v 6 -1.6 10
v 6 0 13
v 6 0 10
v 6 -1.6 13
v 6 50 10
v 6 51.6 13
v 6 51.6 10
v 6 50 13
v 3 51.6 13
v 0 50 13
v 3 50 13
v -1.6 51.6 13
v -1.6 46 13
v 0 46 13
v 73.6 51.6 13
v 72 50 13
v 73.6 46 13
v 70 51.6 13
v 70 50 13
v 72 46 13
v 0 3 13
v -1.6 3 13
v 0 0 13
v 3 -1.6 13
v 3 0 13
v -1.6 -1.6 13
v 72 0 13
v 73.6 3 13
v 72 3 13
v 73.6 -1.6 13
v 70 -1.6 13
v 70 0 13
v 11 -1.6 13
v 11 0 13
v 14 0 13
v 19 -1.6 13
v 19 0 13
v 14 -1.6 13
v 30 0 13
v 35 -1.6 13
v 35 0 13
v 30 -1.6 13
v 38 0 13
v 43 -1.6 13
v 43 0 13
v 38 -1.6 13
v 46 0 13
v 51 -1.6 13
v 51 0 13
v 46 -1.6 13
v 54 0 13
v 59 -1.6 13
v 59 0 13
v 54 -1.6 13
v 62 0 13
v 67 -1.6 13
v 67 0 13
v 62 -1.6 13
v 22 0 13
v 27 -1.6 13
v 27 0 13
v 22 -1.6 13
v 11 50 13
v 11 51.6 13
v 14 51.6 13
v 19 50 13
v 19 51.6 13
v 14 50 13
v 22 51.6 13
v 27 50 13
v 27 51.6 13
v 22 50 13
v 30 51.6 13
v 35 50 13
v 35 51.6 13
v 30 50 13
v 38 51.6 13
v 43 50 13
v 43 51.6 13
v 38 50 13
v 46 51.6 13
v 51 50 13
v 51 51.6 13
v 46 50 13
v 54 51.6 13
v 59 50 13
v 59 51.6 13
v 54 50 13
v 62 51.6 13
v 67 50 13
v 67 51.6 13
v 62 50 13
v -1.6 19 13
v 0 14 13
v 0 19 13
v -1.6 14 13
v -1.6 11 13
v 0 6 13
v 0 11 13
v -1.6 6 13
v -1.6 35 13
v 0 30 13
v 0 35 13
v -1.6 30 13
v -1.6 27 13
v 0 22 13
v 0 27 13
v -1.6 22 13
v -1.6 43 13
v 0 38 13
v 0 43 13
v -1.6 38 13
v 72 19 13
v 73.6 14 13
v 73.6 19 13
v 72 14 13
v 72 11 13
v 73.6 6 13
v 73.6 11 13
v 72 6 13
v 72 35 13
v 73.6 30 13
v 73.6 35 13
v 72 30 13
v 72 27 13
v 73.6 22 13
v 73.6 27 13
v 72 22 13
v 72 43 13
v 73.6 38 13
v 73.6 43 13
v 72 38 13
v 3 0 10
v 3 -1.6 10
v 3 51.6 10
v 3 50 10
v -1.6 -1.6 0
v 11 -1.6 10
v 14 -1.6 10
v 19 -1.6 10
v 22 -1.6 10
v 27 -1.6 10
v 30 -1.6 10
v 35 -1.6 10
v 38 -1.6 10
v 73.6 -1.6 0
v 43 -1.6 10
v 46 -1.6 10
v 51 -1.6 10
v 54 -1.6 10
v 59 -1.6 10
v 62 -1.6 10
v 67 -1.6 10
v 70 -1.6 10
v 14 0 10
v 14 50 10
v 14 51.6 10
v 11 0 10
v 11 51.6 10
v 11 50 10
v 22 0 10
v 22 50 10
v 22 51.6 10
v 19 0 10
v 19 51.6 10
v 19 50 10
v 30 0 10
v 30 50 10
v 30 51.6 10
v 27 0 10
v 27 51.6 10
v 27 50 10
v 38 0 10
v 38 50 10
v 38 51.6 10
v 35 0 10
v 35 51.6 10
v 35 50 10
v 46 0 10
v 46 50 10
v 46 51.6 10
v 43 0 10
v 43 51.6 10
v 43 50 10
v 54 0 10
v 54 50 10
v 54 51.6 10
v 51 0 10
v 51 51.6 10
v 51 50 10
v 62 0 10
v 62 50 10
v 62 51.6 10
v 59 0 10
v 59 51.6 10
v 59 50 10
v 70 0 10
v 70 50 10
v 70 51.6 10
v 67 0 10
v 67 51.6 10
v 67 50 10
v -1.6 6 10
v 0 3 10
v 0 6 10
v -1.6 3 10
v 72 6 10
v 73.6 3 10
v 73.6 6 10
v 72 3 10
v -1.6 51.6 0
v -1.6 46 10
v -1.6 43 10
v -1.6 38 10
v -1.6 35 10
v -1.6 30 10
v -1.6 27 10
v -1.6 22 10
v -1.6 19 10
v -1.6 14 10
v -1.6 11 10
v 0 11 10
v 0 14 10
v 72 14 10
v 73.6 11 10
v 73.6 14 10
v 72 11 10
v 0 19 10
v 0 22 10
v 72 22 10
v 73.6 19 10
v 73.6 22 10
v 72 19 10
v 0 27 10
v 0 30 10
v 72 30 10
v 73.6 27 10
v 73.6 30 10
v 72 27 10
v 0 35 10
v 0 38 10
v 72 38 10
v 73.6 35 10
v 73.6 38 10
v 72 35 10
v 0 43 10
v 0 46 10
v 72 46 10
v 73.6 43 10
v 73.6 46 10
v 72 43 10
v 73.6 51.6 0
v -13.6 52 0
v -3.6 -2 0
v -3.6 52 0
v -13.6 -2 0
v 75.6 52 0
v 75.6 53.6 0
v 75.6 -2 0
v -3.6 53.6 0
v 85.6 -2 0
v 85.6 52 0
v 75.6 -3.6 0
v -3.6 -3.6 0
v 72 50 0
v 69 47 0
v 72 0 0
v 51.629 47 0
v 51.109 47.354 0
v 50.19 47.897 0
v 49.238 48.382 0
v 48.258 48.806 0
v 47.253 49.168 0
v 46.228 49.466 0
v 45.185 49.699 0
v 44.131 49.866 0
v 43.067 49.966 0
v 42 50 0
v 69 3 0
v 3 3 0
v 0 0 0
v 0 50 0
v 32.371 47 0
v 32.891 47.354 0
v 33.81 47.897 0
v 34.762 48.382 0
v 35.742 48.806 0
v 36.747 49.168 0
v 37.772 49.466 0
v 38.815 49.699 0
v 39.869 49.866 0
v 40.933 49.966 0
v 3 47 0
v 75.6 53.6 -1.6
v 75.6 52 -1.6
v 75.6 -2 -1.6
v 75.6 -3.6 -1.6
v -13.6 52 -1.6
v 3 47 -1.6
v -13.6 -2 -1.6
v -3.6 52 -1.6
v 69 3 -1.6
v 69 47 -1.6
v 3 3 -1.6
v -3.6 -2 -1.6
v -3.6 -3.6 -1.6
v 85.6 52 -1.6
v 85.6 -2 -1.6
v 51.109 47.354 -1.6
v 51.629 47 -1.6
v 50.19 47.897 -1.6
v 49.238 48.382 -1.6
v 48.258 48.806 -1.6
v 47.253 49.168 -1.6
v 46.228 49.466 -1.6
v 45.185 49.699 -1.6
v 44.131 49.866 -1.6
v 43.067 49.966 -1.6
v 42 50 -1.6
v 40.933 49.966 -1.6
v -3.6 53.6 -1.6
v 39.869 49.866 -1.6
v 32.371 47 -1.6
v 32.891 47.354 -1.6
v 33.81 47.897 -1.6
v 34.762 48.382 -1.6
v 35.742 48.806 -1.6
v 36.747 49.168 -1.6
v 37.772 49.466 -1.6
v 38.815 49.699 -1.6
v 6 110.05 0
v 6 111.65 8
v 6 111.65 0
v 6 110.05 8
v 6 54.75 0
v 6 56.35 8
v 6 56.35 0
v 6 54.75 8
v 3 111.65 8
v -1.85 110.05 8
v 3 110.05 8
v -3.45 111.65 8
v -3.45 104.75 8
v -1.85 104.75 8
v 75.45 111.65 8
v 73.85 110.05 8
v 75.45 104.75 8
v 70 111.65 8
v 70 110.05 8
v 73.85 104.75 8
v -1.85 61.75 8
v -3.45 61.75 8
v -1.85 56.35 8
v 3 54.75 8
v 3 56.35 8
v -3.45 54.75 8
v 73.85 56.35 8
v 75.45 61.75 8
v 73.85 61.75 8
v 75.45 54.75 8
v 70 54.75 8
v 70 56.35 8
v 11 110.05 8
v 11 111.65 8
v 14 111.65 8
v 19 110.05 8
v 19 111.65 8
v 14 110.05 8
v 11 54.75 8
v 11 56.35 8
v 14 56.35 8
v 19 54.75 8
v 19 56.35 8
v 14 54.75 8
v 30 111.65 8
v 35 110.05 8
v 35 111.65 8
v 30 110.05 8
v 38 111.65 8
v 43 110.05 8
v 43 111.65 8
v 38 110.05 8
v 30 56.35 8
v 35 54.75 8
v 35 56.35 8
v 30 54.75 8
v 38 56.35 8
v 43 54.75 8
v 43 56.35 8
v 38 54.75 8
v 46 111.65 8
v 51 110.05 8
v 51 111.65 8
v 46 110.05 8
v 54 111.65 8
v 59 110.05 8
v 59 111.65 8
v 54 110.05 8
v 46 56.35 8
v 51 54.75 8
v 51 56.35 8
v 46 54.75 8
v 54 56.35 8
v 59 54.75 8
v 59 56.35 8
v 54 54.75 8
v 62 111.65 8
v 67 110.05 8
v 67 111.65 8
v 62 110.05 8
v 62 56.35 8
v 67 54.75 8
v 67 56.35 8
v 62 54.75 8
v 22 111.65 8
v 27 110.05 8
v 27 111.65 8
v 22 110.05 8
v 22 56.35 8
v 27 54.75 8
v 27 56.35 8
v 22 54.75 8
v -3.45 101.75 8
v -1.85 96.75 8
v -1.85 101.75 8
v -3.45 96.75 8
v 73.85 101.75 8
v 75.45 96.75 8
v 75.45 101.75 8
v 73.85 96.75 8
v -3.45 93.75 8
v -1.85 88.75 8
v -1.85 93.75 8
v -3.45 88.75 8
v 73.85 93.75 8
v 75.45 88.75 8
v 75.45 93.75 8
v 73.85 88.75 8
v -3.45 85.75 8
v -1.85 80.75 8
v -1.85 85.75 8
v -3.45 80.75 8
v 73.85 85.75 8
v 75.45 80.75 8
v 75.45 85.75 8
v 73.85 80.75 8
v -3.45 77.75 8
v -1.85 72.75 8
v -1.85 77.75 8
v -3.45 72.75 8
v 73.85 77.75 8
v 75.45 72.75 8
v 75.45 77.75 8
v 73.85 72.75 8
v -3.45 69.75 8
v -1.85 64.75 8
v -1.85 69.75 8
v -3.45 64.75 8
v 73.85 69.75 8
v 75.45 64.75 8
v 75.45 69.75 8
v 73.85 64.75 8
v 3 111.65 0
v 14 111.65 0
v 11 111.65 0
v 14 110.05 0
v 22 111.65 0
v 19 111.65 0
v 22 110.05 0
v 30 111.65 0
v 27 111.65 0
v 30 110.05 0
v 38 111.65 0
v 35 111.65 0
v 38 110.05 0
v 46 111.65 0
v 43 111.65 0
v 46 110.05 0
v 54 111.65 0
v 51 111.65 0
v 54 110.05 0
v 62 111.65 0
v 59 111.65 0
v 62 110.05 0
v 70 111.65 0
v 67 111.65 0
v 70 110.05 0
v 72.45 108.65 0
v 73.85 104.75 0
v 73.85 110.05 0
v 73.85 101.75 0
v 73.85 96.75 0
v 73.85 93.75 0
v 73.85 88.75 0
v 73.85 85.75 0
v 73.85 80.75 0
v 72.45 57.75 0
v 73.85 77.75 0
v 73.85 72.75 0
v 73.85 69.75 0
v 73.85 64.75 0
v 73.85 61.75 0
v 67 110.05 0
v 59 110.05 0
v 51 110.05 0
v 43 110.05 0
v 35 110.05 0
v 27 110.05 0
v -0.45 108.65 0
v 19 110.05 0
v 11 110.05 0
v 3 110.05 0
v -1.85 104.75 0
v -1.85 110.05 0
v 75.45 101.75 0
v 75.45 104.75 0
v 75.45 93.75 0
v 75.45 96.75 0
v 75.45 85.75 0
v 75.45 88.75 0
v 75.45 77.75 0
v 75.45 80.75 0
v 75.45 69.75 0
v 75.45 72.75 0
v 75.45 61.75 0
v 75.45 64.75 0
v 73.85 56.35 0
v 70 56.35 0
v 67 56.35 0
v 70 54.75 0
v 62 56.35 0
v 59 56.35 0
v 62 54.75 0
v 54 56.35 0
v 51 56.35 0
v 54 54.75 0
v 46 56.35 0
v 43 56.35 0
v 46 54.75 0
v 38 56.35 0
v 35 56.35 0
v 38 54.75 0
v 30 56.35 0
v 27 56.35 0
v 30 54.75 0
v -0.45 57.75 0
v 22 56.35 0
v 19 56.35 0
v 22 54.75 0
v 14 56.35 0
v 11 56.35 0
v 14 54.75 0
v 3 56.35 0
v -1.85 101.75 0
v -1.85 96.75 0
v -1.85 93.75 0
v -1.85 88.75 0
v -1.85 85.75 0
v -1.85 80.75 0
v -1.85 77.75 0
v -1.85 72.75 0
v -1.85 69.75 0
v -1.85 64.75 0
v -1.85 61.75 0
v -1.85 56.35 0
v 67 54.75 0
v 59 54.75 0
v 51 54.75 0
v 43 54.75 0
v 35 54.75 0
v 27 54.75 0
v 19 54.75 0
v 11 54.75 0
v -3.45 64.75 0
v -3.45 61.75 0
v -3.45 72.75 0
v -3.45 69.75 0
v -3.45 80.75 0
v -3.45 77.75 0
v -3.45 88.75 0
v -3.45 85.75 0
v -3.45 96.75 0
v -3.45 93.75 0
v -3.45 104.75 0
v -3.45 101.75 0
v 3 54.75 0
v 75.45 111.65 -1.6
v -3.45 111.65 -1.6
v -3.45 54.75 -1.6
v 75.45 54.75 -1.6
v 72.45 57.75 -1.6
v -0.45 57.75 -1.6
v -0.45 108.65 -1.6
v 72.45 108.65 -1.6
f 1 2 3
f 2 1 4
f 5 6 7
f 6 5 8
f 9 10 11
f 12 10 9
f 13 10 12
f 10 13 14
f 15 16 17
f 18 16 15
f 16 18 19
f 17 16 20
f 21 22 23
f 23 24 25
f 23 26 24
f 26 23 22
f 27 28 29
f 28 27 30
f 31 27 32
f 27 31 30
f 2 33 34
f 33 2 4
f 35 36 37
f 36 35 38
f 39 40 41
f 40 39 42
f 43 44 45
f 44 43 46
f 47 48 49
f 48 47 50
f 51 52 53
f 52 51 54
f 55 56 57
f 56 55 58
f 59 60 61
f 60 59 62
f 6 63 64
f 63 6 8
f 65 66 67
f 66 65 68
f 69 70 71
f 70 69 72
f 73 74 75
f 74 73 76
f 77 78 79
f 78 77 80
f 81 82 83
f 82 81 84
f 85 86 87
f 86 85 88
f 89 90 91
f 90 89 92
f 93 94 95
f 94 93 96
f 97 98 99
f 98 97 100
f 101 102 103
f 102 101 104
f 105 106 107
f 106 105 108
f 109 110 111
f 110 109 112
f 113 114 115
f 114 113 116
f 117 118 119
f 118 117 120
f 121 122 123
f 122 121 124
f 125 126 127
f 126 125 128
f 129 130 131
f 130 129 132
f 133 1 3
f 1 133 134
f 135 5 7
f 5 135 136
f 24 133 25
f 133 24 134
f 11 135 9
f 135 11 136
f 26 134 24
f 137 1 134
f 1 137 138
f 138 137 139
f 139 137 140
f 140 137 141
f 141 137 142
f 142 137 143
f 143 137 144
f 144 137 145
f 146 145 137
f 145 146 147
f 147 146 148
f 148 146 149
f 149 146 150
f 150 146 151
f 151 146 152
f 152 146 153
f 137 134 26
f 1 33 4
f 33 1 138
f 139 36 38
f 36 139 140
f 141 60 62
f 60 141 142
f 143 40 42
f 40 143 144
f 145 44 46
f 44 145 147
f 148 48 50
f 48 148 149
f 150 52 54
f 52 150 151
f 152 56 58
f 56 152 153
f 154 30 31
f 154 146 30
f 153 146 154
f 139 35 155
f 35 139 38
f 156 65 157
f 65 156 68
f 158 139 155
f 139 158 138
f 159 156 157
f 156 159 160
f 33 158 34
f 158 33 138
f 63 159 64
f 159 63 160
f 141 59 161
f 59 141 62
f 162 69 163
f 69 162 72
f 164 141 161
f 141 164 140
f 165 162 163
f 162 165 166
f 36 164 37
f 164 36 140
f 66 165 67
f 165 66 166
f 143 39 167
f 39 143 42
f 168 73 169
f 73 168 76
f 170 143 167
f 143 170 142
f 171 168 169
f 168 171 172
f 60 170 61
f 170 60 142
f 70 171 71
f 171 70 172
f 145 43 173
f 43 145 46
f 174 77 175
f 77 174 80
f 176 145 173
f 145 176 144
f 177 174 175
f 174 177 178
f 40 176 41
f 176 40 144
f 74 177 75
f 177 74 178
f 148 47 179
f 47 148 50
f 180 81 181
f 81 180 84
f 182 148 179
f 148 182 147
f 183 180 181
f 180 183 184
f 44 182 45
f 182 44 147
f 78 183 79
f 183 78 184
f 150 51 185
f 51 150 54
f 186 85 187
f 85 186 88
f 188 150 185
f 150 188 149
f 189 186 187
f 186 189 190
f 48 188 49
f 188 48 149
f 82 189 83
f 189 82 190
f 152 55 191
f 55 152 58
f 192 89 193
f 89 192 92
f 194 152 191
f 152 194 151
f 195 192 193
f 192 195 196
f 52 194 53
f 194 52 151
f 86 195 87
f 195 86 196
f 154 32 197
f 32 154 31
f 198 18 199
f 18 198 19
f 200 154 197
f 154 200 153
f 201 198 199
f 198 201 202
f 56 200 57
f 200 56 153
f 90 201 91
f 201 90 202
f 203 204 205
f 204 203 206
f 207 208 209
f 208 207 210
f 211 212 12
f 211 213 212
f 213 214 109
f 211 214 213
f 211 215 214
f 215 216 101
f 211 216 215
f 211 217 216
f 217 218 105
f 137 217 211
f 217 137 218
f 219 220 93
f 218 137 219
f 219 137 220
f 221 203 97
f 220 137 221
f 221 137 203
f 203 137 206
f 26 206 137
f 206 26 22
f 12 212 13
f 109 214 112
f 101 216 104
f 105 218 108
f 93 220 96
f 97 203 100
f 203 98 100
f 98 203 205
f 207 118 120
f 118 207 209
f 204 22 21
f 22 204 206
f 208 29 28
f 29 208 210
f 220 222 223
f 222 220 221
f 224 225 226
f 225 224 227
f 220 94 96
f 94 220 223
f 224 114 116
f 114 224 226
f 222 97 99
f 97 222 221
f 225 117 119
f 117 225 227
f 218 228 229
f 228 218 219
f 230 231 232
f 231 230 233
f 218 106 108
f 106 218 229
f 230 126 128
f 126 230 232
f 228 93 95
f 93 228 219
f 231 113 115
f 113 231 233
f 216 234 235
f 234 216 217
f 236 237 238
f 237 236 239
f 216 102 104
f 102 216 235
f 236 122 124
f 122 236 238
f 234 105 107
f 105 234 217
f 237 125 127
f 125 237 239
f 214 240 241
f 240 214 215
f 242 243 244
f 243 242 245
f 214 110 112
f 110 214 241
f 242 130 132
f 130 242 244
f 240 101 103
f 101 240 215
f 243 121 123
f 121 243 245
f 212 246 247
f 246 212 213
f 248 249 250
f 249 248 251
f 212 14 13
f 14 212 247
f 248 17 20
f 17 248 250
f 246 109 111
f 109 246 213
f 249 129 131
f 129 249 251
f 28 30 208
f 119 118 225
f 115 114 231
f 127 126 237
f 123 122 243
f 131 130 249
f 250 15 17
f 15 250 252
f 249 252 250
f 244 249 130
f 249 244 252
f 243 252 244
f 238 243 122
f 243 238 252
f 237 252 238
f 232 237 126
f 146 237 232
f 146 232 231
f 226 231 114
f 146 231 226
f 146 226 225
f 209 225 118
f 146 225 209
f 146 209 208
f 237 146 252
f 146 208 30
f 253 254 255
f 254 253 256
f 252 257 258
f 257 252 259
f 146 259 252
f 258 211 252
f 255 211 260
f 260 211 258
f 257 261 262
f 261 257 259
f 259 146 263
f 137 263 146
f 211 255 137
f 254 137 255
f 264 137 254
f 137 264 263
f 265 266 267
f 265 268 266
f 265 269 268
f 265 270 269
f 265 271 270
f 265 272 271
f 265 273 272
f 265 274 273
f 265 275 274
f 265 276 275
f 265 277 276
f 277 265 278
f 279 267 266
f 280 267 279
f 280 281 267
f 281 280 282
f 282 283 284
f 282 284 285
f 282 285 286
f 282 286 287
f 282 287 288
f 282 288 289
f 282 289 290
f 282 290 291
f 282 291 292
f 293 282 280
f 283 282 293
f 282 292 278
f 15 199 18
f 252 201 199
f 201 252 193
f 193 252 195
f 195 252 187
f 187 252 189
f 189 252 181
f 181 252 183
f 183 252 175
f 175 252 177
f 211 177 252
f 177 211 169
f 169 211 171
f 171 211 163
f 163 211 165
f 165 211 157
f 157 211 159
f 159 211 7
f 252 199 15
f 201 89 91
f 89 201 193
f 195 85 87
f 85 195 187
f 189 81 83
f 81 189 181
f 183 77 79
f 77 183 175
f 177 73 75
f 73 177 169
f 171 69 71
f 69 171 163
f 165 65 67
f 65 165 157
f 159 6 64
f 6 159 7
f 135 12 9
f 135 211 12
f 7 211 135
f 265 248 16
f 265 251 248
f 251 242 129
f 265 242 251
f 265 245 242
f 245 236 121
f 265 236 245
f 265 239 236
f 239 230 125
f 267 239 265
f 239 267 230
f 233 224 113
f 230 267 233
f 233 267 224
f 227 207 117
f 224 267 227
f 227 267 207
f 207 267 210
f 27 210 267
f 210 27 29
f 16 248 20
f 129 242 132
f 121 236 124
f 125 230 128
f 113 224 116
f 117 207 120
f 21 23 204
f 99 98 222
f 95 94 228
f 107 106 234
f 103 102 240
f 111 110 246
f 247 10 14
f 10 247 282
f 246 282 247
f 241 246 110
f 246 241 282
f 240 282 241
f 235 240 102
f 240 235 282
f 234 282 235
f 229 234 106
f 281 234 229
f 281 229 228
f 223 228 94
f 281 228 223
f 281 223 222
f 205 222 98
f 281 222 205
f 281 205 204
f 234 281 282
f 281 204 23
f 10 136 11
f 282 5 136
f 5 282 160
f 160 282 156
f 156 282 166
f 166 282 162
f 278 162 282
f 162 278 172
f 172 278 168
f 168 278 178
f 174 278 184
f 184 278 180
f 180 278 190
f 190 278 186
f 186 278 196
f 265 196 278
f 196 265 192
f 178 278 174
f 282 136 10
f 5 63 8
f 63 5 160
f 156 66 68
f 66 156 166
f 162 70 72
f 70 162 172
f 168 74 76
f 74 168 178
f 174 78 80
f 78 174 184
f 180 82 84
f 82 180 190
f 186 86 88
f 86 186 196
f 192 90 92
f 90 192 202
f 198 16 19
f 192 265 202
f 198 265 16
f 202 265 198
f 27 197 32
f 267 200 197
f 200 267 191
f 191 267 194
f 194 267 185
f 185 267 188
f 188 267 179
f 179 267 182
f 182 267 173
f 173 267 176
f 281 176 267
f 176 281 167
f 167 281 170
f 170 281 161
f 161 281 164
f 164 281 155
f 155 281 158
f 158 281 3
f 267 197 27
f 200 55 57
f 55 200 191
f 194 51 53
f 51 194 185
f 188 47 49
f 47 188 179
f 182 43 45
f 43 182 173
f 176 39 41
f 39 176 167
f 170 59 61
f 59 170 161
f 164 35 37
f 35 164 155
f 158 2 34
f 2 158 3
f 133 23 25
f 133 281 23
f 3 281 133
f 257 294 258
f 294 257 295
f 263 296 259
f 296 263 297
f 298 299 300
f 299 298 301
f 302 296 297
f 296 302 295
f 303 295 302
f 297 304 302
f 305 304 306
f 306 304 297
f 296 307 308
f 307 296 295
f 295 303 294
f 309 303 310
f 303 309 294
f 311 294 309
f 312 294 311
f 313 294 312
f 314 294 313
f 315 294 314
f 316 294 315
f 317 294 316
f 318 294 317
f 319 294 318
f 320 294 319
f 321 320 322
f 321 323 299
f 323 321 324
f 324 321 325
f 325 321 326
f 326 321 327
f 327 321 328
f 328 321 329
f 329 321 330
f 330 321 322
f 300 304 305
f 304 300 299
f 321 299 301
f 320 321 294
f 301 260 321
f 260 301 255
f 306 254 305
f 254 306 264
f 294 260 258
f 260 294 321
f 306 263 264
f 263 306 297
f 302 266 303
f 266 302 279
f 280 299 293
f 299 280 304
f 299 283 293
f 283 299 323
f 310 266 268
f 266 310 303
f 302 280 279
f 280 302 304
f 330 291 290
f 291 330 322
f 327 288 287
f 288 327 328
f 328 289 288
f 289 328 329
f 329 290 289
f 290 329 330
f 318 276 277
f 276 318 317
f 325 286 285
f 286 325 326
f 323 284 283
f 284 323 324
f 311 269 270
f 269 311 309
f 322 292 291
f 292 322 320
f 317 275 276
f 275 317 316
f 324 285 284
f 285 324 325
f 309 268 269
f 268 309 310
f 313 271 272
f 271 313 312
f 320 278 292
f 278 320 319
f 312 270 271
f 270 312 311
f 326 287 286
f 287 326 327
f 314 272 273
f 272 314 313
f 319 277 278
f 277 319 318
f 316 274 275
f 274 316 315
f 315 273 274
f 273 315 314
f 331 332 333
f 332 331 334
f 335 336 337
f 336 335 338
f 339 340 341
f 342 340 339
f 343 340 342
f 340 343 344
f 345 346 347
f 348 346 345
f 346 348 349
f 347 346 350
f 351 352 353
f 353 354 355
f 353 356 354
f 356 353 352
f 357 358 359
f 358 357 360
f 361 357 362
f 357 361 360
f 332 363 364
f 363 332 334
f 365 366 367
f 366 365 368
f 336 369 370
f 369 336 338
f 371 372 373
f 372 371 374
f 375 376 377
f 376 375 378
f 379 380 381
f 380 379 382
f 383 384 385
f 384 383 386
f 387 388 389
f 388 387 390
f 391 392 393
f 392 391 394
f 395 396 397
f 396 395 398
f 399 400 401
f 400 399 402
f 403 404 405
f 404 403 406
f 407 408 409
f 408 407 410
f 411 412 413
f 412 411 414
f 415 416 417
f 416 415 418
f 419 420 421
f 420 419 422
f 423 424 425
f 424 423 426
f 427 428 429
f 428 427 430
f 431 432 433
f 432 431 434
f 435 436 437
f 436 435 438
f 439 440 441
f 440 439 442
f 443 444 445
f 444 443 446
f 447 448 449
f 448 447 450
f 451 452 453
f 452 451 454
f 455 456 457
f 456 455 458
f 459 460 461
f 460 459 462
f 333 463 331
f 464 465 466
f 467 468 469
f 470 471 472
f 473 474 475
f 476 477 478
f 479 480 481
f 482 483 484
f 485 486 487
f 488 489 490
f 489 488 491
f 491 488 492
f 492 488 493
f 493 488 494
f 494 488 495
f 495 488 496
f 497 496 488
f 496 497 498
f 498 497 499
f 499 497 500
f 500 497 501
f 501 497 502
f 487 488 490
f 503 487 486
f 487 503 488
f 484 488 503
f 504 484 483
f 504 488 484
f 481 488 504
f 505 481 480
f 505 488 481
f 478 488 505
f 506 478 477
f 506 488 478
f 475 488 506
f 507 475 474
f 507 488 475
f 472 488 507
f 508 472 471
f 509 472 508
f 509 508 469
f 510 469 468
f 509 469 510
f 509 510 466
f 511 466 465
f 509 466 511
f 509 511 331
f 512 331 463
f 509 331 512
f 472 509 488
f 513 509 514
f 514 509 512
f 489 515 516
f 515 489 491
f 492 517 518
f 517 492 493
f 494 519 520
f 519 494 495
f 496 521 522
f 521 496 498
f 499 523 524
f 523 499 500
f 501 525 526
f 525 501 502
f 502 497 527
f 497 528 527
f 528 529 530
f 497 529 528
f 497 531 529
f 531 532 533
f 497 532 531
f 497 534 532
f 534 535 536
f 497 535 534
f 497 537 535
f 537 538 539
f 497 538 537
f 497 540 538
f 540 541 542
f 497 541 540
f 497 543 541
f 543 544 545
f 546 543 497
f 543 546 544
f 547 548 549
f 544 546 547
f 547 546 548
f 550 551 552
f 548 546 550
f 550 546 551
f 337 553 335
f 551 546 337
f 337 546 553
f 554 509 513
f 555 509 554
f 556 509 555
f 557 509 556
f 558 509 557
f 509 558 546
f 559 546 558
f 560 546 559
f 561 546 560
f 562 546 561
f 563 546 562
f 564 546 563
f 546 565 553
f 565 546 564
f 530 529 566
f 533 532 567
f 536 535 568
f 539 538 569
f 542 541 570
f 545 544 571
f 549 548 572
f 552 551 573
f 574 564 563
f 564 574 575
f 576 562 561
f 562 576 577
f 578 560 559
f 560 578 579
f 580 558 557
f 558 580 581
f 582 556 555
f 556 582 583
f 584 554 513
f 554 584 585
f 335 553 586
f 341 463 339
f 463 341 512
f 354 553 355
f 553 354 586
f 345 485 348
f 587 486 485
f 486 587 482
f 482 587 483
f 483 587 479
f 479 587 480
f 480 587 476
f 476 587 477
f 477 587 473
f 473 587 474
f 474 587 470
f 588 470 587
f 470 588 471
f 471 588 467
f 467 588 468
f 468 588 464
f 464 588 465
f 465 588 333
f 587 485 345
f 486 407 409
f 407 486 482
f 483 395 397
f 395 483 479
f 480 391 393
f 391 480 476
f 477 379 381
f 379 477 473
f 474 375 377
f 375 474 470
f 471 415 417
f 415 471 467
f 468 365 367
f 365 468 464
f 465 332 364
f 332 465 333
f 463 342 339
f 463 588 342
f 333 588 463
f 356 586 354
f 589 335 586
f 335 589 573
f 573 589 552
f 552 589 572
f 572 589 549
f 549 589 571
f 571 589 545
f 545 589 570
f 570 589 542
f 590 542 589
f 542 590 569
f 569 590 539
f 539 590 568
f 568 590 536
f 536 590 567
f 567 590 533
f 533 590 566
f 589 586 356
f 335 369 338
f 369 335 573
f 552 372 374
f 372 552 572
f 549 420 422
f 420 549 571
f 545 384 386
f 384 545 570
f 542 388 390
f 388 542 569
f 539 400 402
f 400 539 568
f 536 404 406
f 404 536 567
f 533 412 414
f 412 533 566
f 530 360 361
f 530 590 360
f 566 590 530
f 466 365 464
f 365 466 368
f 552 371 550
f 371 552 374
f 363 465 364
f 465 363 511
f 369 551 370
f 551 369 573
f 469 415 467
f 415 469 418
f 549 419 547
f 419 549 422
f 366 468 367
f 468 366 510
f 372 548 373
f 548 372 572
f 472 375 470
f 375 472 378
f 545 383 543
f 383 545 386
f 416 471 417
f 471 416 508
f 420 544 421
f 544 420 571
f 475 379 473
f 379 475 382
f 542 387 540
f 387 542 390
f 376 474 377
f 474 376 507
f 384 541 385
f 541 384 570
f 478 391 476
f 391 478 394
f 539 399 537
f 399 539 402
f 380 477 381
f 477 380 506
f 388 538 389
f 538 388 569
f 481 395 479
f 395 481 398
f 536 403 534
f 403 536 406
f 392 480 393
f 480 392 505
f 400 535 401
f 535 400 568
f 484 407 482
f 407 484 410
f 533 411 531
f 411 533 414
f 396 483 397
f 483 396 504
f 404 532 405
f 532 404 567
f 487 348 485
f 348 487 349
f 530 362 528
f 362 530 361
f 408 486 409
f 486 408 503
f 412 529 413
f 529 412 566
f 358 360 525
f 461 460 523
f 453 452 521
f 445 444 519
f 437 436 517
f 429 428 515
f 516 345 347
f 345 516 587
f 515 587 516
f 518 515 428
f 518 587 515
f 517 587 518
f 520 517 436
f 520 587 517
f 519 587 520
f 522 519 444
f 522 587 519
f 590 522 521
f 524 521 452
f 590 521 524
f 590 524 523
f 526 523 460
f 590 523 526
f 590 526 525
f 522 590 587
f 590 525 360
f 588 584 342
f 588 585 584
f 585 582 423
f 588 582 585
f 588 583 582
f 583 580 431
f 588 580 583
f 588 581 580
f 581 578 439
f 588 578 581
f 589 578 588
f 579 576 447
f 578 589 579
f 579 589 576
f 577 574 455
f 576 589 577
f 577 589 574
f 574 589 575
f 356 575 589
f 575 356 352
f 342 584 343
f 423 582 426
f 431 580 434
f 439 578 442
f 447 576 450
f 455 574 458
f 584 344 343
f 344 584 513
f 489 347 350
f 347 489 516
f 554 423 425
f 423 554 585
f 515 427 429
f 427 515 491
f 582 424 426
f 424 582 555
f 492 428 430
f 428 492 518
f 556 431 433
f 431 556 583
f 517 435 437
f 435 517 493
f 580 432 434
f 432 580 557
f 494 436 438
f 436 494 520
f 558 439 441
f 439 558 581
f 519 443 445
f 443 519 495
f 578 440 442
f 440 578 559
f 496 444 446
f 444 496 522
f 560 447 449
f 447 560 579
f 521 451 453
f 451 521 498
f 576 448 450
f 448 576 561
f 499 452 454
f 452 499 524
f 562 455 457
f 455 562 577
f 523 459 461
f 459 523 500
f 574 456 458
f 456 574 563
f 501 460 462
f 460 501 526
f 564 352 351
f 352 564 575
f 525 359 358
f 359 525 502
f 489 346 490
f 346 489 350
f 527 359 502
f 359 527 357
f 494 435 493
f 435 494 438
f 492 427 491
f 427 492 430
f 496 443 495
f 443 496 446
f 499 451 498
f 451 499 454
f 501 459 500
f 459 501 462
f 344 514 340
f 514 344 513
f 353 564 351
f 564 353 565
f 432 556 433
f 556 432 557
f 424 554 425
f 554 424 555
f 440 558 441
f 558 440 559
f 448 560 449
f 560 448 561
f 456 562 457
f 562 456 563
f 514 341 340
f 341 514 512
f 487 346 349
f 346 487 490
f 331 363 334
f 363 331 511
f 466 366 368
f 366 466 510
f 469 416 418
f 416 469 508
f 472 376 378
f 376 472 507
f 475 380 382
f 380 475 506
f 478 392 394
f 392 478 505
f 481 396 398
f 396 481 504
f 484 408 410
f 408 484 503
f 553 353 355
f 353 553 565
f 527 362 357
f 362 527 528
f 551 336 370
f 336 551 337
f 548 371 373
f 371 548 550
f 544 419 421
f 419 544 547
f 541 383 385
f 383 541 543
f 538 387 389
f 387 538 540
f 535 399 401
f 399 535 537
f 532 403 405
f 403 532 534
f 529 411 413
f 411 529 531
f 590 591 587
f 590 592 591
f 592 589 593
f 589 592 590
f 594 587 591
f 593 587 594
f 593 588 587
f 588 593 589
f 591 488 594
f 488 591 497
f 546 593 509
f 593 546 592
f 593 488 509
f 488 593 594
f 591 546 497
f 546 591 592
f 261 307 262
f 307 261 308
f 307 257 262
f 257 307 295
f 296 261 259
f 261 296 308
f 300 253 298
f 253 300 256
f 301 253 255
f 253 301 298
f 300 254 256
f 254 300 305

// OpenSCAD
//design and code by bioprint (http://www.thingiverse.com/bioprint)
//This code generates a holder for Microfluidics Chamber (customizable)
// 2015-01-16:	first design



// Size of nozzle
SizeOfNozzle = 0.4; // size of nozzle
// Endholder Width
EndholderWidth = 54; // 54 mm for Nikon Ti holder
// Endholder Lip
EndholderLip = 10; // 3 mm

// Objective Diameter
ObjectiveDiameter = 34; // 34 mm
// Objective Center X
ObjectiveCenterX = 42; // 42 mm
// Objective Center Y
ObjectiveCenterY = 33; // 33 mm
// Objective Rim
ObjectiveRim = 3; // 3 mm

// Bottom thickness measured in layers
BottomThicknessInLayers = 4; // number of layers
// Wall thickness measured in layers
WallThicknessInLayers = 4; // number of layers
// Inner Skirt Width
InnerSkirtWidth = 3; // 3 mm

// Outer Skirt Width
OuterSkirtWidth = 2; // 2 mm

// Wall Height
WallHeight = 13; // 10 mm
// NotchSize
NotchSize = 3; // 3 mm
// Inner Width
InnerWidth = 50; // 50 mm
// Inner Length
InnerLength = 72; // 72 mm


// NotchDistance
NotchDistance = 8; // 8 mm

// LidTolerance
LidTolerance = 0.5; // 1 mm
// Lid Height
LidHeight = 8; // 8 mm


WallThicknessInMM = WallThicknessInLayers*SizeOfNozzle;

//OuterSkirtWidth = MaximumWidth - 2*WallThicknessInMM - InnerWidth;

BottomThicknessInLayersInMM = BottomThicknessInLayers*SizeOfNozzle;
// this arrangement barely fits the 150 mm build table
// LidXOffset = InnerLength + 2*WallThicknessInMM + OuterSkirtWidth + InnerSkirtWidth; 

LidXOffset = 0;
LidYOffset = InnerWidth + 2*WallThicknessInMM + OuterSkirtWidth + InnerSkirtWidth; 

// cylinder(h = 10, r=20, $fn=100);



// bottom layer
difference(){
	translate([-1*WallThicknessInMM,-1*WallThicknessInMM,0]) 
		cube(size = [InnerLength + WallThicknessInMM * 2,
						InnerWidth + WallThicknessInMM * 2,
						WallHeight], center = false);
	translate([0,0,0]) 
		cube(size = [InnerLength,
						InnerWidth,
						WallHeight], center = false);
	// notches
//	for ( c = [NotchDistance/2 : NotchDistance : InnerLength - NotchDistance/2] )
//	{
//		translate([c,
//						-1*WallThicknessInMM,
//						0]) 
//		cube(size = [NotchDistance/2,
//						WallThicknessInMM+2,
//						WallHeight], center = false);
//
//	}

	for ( c = [NotchSize : NotchDistance : InnerLength-NotchSize] )
	{
		translate([c,
						-1*WallThicknessInMM,
						WallHeight-NotchSize]) 
		cube(size = [NotchSize,
						 InnerWidth+3*WallThicknessInMM,
						 NotchSize], center = false);

	}

	for ( c = [NotchSize : NotchDistance : InnerWidth-NotchSize] )
	{
		translate([-1*WallThicknessInMM,
						c,
						WallHeight-NotchSize]) 
		cube(size = [InnerLength+3*WallThicknessInMM,
							NotchSize,
						 	NotchSize], center = false);

	}
// cut cylinder
	translate([ObjectiveCenterX, ObjectiveCenterY, -1*BottomThicknessInLayersInMM])
		cylinder(h = BottomThicknessInLayersInMM + WallHeight, r=ObjectiveDiameter/2, $fn=10);

}

// skirts
//BottomThicknessInLayersInMM  InnerSkirtWidth OuterSkirtWidth
difference(){
	translate([-1*WallThicknessInMM-OuterSkirtWidth,
					-1*WallThicknessInMM-OuterSkirtWidth,
					-1*BottomThicknessInLayersInMM]) 
		cube(size = [InnerLength + (WallThicknessInMM+OuterSkirtWidth) * 2,
						InnerWidth + (WallThicknessInMM+OuterSkirtWidth) * 2,
						BottomThicknessInLayersInMM], center = false);

	translate([	0,
				  	0,
					-1*BottomThicknessInLayersInMM]) 
		cube(size = [InnerLength,
						InnerWidth,
						BottomThicknessInLayersInMM], center = false);


// cut cylinder
	translate([ObjectiveCenterX, ObjectiveCenterY, -1*BottomThicknessInLayersInMM])
		cylinder(h = BottomThicknessInLayersInMM + WallHeight, r=ObjectiveDiameter/2, $fn=10);

}

// end holders
	// holders on sides (Nikon C2)

//EndholderWidth = 54; // 54 mm for Nikon Ti holder
// Endholder Lip
//EndholderLip = 10; // 3 mm

	translate([-1*WallThicknessInMM-OuterSkirtWidth + InnerLength + (WallThicknessInMM+OuterSkirtWidth) * 2,
					-1*WallThicknessInMM-OuterSkirtWidth + (InnerWidth + (WallThicknessInMM+OuterSkirtWidth) * 2)/2 - EndholderWidth/2,
					-1*BottomThicknessInLayersInMM]) 
		cube(size = [EndholderLip,
						 EndholderWidth,
						 BottomThicknessInLayersInMM], center = false);


	translate([-1*WallThicknessInMM-OuterSkirtWidth - EndholderLip,
					-1*WallThicknessInMM-OuterSkirtWidth + (InnerWidth + (WallThicknessInMM+OuterSkirtWidth) * 2)/2 - EndholderWidth/2,
					-1*BottomThicknessInLayersInMM]) 
		cube(size = [EndholderLip,
						 EndholderWidth,
						 BottomThicknessInLayersInMM], center = false);

// inner lip

difference(){
	translate([-1*WallThicknessInMM,
					-1*WallThicknessInMM,
					-1*BottomThicknessInLayersInMM]) 
		cube(size = [InnerLength + (WallThicknessInMM) * 2,
						InnerWidth + (WallThicknessInMM) * 2,
						BottomThicknessInLayersInMM], center = false);

	translate([	InnerSkirtWidth,
				  	InnerSkirtWidth,
					-1*BottomThicknessInLayersInMM]) 
		cube(size = [InnerLength-2*InnerSkirtWidth,
						InnerWidth-2*InnerSkirtWidth,
						BottomThicknessInLayersInMM], center = false);

// cut cylinder
	translate([ObjectiveCenterX, ObjectiveCenterY, -1*BottomThicknessInLayersInMM])
		cylinder(h = BottomThicknessInLayersInMM + WallHeight, r=ObjectiveDiameter/2, $fn=100);

}




// Lid
// LidXOffset LidTolerance LidHeight


difference(){
	translate([LidXOffset-2*WallThicknessInMM -LidTolerance/2 , 
				  LidYOffset -2*WallThicknessInMM -LidTolerance/2,0]) 
		cube(size = [InnerLength + WallThicknessInMM * 4 + LidTolerance,
						InnerWidth + WallThicknessInMM * 4 + LidTolerance,
						LidHeight], center = false);
	translate([LidXOffset-WallThicknessInMM -LidTolerance/2 ,
				  LidYOffset-WallThicknessInMM -LidTolerance/2,0]) 
		cube(size = [InnerLength + LidTolerance + 2*WallThicknessInMM,
						InnerWidth + LidTolerance + 2*WallThicknessInMM,
						LidHeight], center = false);

	for ( c = [NotchSize : NotchDistance : InnerLength-NotchSize] )
	{
		translate([c + LidXOffset,
						LidYOffset -2*WallThicknessInMM -LidTolerance/2,
						0])  //LidHeight-NotchSize]
		cube(size = [NotchSize,
						 InnerWidth+4*WallThicknessInMM+LidTolerance,
						 LidHeight], center = false); //NotchSize

	}

	// has to be symmetric
	for ( c = [InnerWidth- NotchSize - 2*WallThicknessInMM - LidTolerance/2  : -1*NotchDistance : NotchSize] )
	{
		translate([-2*WallThicknessInMM-LidTolerance/2 + LidXOffset,
						c + LidYOffset,
						0]) //
		cube(size = [InnerLength+4*WallThicknessInMM+LidTolerance,
							NotchSize,
						 	LidHeight], center = false);

	}


}




difference(){

	translate([LidXOffset-2*WallThicknessInMM -LidTolerance/2 ,
					LidYOffset-2*WallThicknessInMM -LidTolerance/2,
					-1*BottomThicknessInLayersInMM]) 
		cube(size = [InnerLength + WallThicknessInMM * 4 + LidTolerance,
						InnerWidth + WallThicknessInMM * 4 + LidTolerance,
						BottomThicknessInLayersInMM], center = false);


	translate([LidXOffset-2*WallThicknessInMM -LidTolerance/2 + InnerSkirtWidth ,
					LidYOffset-2*WallThicknessInMM -LidTolerance/2 + InnerSkirtWidth,
					-1*BottomThicknessInLayersInMM]) 
		cube(size = [InnerLength + WallThicknessInMM * 4 + LidTolerance - 2*InnerSkirtWidth,
						InnerWidth + WallThicknessInMM * 4 + LidTolerance - 2* InnerSkirtWidth,
						BottomThicknessInLayersInMM], center = false);
}





